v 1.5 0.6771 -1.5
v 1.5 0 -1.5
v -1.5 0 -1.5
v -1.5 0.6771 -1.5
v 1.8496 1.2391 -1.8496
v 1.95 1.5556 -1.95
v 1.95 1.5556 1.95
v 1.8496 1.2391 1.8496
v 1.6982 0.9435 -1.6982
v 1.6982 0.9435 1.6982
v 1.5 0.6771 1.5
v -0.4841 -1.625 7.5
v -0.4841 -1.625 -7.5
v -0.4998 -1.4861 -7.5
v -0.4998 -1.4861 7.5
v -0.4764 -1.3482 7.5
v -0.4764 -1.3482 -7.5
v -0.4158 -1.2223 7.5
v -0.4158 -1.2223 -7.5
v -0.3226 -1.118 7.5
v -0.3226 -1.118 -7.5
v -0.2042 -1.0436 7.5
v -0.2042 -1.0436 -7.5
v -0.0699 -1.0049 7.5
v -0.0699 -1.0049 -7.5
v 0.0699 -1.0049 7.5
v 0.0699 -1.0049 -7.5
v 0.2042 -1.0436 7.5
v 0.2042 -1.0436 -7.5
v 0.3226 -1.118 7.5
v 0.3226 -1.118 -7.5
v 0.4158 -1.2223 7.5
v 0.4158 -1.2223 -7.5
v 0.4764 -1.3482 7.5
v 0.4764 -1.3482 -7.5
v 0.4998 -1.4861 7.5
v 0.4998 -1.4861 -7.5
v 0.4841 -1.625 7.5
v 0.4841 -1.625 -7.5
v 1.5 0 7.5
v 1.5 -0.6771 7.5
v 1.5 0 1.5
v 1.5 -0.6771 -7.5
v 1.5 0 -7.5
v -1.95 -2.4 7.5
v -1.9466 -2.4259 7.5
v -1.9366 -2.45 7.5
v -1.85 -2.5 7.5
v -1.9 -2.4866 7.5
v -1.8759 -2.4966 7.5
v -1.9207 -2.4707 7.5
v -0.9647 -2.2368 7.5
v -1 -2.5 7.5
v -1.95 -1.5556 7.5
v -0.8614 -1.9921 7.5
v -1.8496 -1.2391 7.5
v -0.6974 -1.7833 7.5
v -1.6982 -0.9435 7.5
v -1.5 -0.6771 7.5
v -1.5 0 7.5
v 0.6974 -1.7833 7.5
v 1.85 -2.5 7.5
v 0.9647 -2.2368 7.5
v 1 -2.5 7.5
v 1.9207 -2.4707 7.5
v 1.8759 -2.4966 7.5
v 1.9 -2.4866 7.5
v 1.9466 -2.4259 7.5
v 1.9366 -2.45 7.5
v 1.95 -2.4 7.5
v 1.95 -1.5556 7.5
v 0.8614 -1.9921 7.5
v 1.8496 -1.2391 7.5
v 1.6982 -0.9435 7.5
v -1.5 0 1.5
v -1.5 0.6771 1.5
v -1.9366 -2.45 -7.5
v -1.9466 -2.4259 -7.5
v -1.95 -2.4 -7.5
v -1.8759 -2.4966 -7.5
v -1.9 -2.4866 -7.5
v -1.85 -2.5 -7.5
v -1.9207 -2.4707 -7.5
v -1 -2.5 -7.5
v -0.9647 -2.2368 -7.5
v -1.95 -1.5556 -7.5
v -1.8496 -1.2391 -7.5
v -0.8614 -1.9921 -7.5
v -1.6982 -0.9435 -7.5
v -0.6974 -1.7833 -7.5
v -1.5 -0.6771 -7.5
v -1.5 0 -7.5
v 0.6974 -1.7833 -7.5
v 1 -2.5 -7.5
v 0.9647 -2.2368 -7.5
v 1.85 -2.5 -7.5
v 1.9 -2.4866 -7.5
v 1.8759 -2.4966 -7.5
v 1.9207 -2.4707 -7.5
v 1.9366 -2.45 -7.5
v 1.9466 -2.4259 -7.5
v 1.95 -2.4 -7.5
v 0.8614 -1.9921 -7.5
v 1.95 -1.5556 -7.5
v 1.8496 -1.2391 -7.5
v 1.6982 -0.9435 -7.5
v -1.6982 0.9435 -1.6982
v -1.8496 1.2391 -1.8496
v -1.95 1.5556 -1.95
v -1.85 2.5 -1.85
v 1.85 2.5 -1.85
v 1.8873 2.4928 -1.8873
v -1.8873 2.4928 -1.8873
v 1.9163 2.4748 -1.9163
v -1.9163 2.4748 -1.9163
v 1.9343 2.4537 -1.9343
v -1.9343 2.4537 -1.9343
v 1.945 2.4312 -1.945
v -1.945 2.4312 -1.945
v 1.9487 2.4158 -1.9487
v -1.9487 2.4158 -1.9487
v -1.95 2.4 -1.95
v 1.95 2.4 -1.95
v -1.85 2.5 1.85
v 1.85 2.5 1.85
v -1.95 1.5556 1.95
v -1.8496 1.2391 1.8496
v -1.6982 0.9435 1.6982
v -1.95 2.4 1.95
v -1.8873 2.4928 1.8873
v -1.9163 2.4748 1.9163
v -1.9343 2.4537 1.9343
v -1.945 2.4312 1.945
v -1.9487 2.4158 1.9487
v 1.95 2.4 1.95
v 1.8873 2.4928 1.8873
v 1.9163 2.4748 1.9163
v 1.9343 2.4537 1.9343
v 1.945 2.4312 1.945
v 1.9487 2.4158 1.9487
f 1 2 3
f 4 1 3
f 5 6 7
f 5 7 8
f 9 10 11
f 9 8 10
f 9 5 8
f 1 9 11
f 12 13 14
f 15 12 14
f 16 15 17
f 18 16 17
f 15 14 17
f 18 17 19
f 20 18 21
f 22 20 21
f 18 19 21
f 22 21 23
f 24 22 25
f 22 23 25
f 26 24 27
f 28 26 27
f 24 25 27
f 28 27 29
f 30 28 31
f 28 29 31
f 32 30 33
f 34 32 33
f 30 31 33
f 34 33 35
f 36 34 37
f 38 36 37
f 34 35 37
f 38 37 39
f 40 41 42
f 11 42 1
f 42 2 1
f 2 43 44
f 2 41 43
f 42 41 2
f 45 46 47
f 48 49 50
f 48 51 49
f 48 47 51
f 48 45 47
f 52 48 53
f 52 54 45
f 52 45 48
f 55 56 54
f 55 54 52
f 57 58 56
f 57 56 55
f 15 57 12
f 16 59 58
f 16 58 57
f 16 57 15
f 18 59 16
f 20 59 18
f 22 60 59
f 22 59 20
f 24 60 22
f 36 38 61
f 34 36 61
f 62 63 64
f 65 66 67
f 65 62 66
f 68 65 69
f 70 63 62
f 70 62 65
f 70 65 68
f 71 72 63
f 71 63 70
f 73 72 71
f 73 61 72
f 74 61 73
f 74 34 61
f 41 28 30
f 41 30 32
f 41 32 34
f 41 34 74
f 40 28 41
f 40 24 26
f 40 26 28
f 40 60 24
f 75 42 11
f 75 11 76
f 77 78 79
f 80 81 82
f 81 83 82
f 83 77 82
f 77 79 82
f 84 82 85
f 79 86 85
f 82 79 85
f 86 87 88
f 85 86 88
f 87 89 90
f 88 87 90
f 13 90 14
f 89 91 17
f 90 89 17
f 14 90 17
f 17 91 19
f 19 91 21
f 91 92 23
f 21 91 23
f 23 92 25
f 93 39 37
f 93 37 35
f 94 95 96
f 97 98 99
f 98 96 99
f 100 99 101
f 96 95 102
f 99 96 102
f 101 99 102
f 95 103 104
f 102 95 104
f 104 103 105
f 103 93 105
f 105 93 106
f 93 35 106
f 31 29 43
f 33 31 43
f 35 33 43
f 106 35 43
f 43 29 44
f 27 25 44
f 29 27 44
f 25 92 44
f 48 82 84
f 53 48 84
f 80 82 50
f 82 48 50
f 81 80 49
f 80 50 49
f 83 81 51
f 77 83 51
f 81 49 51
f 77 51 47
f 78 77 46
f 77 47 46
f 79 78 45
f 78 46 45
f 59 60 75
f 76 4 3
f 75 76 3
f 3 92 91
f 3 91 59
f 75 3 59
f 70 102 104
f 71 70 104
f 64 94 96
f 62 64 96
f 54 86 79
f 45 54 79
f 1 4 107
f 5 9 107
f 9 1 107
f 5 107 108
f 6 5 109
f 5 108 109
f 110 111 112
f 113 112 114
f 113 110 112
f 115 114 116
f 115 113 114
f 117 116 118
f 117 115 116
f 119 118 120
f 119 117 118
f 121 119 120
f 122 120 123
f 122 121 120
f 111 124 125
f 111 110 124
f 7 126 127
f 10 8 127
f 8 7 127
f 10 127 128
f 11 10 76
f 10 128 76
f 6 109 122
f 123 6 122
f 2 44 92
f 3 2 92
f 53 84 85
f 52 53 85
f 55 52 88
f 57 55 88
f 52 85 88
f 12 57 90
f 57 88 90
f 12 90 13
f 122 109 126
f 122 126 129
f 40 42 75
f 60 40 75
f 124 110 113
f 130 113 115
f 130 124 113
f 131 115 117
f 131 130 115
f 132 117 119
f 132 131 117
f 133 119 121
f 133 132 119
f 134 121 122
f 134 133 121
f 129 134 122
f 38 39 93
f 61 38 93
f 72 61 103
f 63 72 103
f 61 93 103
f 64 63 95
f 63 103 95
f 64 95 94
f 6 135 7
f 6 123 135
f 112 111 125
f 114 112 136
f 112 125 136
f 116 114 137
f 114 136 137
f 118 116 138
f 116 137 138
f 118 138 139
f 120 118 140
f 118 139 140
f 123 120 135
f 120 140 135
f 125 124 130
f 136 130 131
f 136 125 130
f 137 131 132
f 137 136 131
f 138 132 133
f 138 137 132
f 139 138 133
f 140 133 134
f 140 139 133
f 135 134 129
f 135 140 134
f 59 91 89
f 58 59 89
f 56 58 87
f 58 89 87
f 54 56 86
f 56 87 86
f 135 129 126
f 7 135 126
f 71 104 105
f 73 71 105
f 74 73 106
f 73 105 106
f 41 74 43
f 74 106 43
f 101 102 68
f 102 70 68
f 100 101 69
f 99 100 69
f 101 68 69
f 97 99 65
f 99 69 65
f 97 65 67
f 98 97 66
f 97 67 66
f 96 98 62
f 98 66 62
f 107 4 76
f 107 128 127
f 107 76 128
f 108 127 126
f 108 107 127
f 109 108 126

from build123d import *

# Parameters (mm, degrees)
EXTRUDE_2_DEPTH                 = 7.5
EXTRUDE_2_DEPTH_BACK            = 7.5
SKETCH_3_W                      = 3
SKETCH_3_H                      = 3
EXTRUDE_3_DEPTH                 = 1
EXTRUDE_4_DEPTH                 = 2
EXTRUDE_4_DEPTH_BACK            = 2
CUT_EXTRUDE_1_REACH             = 10.143
CUT_EXTRUDE_1_DIRECTION_2_REACH = 10.143
FILLET_1_R                      = 0.1


with BuildPart() as part:
    # 草图2 → 凸台-拉伸2 (new, two sides: drawn at the far end of the back side and taken through both)
    with BuildSketch(Plane.XY.offset(-EXTRUDE_2_DEPTH_BACK)):
        with BuildLine():
            Line((-1.95, -2.5), (-1, -2.5))
            ThreePointArc((-1, -2.5), (-0.861429892, -1.992123498), (-0.484122918, -1.625))
            ThreePointArc((-0.484122918, -1.625), (0, -1), (0.484122918, -1.625))
            ThreePointArc((0.484122918, -1.625), (0.861429892, -1.992123498), (1, -2.5))
            Line((1, -2.5), (1.95, -2.5))
            Line((1.95, -2.5), (1.95, -1.555590279))
            ThreePointArc((1.95, -1.555590279), (1.780042303, -1.088161527), (1.5, -0.677124344))
            Line((1.5, -0.677124344), (1.5, 0))
            Line((1.5, 0), (-1.5, 0))
            Line((-1.5, 0), (-1.5, -0.677124344))
            ThreePointArc((-1.5, -0.677124344), (-1.780042303, -1.088161527), (-1.95, -1.555590279))
            Line((-1.95, -1.555590279), (-1.95, -2.5))
        make_face()
    extrude(amount=EXTRUDE_2_DEPTH + EXTRUDE_2_DEPTH_BACK)

    # 草图3 → 凸台-拉伸3 (add)
    with BuildSketch(Plane(origin=(0, 0, 0), x_dir=(-1, 0, 0), z_dir=(0, 1, 0))):
        Rectangle(SKETCH_3_W, SKETCH_3_H)
    extrude(amount=EXTRUDE_3_DEPTH)

    # 草图4 → 凸台-拉伸4 (add, two sides: drawn at the far end of the back side and taken through both)
    with BuildSketch(Plane.XY.offset(-EXTRUDE_4_DEPTH_BACK)):
        with BuildLine():
            Line((1.95, 2.5), (-1.95, 2.5))
            Line((-1.95, 2.5), (-1.95, 1.555590279))
            ThreePointArc((-1.95, 1.555590279), (-1.780042303, 1.088161527), (-1.5, 0.677124344))
            Line((-1.5, 0.677124344), (1.5, 0.677124344))
            ThreePointArc((1.5, 0.677124344), (1.780042303, 1.088161527), (1.95, 1.555590279))
            Line((1.95, 1.555590279), (1.95, 2.5))
        make_face()
    extrude(amount=EXTRUDE_4_DEPTH + EXTRUDE_4_DEPTH_BACK)

    # 草图5 → 切除-拉伸1 (cut, up to next)
    with BuildSketch(Plane(origin=(0, 0, 0), x_dir=(0, 0, -1), z_dir=(1, 0, 0)), mode=Mode.PRIVATE) as cut_extrude_1_sk1:
        with BuildLine():
            Line((1.95, 2.5), (2, 2.5))
            Line((2, 2.5), (2, 0.677124344))
            Line((2, 0.677124344), (1.5, 0.677124344))
            ThreePointArc((1.5, 0.677124344), (1.780042303, 1.088161527), (1.95, 1.555590279))
            Line((1.95, 1.555590279), (1.95, 2.5))
        make_face()
    cut_extrude_1_tool1 = extrude(cut_extrude_1_sk1.sketch, amount=-CUT_EXTRUDE_1_REACH, mode=Mode.PRIVATE) & part.part
    # 草图5 → 切除-拉伸1 (cut, up to next)
    with BuildSketch(Plane(origin=(0, 0, 0), x_dir=(0, 0, -1), z_dir=(1, 0, 0)), mode=Mode.PRIVATE) as cut_extrude_1_sk2:
        with BuildLine():
            Line((-1.95, 2.5), (-1.95, 1.555590279))
            ThreePointArc((-1.95, 1.555590279), (-1.780042303, 1.088161527), (-1.5, 0.677124344))
            Line((-1.5, 0.677124344), (-2, 0.677124344))
            Line((-2, 0.677124344), (-2, 2.5))
            Line((-2, 2.5), (-1.95, 2.5))
        make_face()
    cut_extrude_1_tool2 = extrude(cut_extrude_1_sk2.sketch, amount=-CUT_EXTRUDE_1_REACH, mode=Mode.PRIVATE) & part.part
    add(cut_extrude_1_tool1.solids().sort_by_distance((0, 1.175075, -1.873038))[0], mode=Mode.SUBTRACT)
    add(cut_extrude_1_tool2.solids().sort_by_distance((0, 1.175075, 1.873038))[0], mode=Mode.SUBTRACT)

    # 草图5 → 切除-拉伸1 direction 2 (cut, up to next)
    with BuildSketch(Plane(origin=(0, 0, 0), x_dir=(0, 0, -1), z_dir=(1, 0, 0)), mode=Mode.PRIVATE) as cut_extrude_1_direction_2_sk1:
        with BuildLine():
            Line((1.95, 2.5), (2, 2.5))
            Line((2, 2.5), (2, 0.677124344))
            Line((2, 0.677124344), (1.5, 0.677124344))
            ThreePointArc((1.5, 0.677124344), (1.780042303, 1.088161527), (1.95, 1.555590279))
            Line((1.95, 1.555590279), (1.95, 2.5))
        make_face()
    cut_extrude_1_direction_2_tool1 = extrude(cut_extrude_1_direction_2_sk1.sketch, amount=CUT_EXTRUDE_1_DIRECTION_2_REACH, mode=Mode.PRIVATE) & part.part
    # 草图5 → 切除-拉伸1 direction 2 (cut, up to next)
    with BuildSketch(Plane(origin=(0, 0, 0), x_dir=(0, 0, -1), z_dir=(1, 0, 0)), mode=Mode.PRIVATE) as cut_extrude_1_direction_2_sk2:
        with BuildLine():
            Line((-1.95, 2.5), (-1.95, 1.555590279))
            ThreePointArc((-1.95, 1.555590279), (-1.780042303, 1.088161527), (-1.5, 0.677124344))
            Line((-1.5, 0.677124344), (-2, 0.677124344))
            Line((-2, 0.677124344), (-2, 2.5))
            Line((-2, 2.5), (-1.95, 2.5))
        make_face()
    cut_extrude_1_direction_2_tool2 = extrude(cut_extrude_1_direction_2_sk2.sketch, amount=CUT_EXTRUDE_1_DIRECTION_2_REACH, mode=Mode.PRIVATE) & part.part
    add(cut_extrude_1_direction_2_tool1.solids().sort_by_distance((0, 1.175075, -1.873038))[0], mode=Mode.SUBTRACT)
    add(cut_extrude_1_direction_2_tool2.solids().sort_by_distance((0, 1.175075, 1.873038))[0], mode=Mode.SUBTRACT)

    # 圆角1
    fillet_1_edges = [part.edges().sort_by_distance(p)[0] for p in [
        (-1.95, 2.5, 0),
        (0, 2.5, -1.95),
        (1.95, 2.5, 0),
        (0, 2.5, 1.95),
        (-1.95, -2.5, 0),
        (1.95, -2.5, 0),
    ]]
    fillet(fillet_1_edges, radius=FILLET_1_R)


solid = part.part
